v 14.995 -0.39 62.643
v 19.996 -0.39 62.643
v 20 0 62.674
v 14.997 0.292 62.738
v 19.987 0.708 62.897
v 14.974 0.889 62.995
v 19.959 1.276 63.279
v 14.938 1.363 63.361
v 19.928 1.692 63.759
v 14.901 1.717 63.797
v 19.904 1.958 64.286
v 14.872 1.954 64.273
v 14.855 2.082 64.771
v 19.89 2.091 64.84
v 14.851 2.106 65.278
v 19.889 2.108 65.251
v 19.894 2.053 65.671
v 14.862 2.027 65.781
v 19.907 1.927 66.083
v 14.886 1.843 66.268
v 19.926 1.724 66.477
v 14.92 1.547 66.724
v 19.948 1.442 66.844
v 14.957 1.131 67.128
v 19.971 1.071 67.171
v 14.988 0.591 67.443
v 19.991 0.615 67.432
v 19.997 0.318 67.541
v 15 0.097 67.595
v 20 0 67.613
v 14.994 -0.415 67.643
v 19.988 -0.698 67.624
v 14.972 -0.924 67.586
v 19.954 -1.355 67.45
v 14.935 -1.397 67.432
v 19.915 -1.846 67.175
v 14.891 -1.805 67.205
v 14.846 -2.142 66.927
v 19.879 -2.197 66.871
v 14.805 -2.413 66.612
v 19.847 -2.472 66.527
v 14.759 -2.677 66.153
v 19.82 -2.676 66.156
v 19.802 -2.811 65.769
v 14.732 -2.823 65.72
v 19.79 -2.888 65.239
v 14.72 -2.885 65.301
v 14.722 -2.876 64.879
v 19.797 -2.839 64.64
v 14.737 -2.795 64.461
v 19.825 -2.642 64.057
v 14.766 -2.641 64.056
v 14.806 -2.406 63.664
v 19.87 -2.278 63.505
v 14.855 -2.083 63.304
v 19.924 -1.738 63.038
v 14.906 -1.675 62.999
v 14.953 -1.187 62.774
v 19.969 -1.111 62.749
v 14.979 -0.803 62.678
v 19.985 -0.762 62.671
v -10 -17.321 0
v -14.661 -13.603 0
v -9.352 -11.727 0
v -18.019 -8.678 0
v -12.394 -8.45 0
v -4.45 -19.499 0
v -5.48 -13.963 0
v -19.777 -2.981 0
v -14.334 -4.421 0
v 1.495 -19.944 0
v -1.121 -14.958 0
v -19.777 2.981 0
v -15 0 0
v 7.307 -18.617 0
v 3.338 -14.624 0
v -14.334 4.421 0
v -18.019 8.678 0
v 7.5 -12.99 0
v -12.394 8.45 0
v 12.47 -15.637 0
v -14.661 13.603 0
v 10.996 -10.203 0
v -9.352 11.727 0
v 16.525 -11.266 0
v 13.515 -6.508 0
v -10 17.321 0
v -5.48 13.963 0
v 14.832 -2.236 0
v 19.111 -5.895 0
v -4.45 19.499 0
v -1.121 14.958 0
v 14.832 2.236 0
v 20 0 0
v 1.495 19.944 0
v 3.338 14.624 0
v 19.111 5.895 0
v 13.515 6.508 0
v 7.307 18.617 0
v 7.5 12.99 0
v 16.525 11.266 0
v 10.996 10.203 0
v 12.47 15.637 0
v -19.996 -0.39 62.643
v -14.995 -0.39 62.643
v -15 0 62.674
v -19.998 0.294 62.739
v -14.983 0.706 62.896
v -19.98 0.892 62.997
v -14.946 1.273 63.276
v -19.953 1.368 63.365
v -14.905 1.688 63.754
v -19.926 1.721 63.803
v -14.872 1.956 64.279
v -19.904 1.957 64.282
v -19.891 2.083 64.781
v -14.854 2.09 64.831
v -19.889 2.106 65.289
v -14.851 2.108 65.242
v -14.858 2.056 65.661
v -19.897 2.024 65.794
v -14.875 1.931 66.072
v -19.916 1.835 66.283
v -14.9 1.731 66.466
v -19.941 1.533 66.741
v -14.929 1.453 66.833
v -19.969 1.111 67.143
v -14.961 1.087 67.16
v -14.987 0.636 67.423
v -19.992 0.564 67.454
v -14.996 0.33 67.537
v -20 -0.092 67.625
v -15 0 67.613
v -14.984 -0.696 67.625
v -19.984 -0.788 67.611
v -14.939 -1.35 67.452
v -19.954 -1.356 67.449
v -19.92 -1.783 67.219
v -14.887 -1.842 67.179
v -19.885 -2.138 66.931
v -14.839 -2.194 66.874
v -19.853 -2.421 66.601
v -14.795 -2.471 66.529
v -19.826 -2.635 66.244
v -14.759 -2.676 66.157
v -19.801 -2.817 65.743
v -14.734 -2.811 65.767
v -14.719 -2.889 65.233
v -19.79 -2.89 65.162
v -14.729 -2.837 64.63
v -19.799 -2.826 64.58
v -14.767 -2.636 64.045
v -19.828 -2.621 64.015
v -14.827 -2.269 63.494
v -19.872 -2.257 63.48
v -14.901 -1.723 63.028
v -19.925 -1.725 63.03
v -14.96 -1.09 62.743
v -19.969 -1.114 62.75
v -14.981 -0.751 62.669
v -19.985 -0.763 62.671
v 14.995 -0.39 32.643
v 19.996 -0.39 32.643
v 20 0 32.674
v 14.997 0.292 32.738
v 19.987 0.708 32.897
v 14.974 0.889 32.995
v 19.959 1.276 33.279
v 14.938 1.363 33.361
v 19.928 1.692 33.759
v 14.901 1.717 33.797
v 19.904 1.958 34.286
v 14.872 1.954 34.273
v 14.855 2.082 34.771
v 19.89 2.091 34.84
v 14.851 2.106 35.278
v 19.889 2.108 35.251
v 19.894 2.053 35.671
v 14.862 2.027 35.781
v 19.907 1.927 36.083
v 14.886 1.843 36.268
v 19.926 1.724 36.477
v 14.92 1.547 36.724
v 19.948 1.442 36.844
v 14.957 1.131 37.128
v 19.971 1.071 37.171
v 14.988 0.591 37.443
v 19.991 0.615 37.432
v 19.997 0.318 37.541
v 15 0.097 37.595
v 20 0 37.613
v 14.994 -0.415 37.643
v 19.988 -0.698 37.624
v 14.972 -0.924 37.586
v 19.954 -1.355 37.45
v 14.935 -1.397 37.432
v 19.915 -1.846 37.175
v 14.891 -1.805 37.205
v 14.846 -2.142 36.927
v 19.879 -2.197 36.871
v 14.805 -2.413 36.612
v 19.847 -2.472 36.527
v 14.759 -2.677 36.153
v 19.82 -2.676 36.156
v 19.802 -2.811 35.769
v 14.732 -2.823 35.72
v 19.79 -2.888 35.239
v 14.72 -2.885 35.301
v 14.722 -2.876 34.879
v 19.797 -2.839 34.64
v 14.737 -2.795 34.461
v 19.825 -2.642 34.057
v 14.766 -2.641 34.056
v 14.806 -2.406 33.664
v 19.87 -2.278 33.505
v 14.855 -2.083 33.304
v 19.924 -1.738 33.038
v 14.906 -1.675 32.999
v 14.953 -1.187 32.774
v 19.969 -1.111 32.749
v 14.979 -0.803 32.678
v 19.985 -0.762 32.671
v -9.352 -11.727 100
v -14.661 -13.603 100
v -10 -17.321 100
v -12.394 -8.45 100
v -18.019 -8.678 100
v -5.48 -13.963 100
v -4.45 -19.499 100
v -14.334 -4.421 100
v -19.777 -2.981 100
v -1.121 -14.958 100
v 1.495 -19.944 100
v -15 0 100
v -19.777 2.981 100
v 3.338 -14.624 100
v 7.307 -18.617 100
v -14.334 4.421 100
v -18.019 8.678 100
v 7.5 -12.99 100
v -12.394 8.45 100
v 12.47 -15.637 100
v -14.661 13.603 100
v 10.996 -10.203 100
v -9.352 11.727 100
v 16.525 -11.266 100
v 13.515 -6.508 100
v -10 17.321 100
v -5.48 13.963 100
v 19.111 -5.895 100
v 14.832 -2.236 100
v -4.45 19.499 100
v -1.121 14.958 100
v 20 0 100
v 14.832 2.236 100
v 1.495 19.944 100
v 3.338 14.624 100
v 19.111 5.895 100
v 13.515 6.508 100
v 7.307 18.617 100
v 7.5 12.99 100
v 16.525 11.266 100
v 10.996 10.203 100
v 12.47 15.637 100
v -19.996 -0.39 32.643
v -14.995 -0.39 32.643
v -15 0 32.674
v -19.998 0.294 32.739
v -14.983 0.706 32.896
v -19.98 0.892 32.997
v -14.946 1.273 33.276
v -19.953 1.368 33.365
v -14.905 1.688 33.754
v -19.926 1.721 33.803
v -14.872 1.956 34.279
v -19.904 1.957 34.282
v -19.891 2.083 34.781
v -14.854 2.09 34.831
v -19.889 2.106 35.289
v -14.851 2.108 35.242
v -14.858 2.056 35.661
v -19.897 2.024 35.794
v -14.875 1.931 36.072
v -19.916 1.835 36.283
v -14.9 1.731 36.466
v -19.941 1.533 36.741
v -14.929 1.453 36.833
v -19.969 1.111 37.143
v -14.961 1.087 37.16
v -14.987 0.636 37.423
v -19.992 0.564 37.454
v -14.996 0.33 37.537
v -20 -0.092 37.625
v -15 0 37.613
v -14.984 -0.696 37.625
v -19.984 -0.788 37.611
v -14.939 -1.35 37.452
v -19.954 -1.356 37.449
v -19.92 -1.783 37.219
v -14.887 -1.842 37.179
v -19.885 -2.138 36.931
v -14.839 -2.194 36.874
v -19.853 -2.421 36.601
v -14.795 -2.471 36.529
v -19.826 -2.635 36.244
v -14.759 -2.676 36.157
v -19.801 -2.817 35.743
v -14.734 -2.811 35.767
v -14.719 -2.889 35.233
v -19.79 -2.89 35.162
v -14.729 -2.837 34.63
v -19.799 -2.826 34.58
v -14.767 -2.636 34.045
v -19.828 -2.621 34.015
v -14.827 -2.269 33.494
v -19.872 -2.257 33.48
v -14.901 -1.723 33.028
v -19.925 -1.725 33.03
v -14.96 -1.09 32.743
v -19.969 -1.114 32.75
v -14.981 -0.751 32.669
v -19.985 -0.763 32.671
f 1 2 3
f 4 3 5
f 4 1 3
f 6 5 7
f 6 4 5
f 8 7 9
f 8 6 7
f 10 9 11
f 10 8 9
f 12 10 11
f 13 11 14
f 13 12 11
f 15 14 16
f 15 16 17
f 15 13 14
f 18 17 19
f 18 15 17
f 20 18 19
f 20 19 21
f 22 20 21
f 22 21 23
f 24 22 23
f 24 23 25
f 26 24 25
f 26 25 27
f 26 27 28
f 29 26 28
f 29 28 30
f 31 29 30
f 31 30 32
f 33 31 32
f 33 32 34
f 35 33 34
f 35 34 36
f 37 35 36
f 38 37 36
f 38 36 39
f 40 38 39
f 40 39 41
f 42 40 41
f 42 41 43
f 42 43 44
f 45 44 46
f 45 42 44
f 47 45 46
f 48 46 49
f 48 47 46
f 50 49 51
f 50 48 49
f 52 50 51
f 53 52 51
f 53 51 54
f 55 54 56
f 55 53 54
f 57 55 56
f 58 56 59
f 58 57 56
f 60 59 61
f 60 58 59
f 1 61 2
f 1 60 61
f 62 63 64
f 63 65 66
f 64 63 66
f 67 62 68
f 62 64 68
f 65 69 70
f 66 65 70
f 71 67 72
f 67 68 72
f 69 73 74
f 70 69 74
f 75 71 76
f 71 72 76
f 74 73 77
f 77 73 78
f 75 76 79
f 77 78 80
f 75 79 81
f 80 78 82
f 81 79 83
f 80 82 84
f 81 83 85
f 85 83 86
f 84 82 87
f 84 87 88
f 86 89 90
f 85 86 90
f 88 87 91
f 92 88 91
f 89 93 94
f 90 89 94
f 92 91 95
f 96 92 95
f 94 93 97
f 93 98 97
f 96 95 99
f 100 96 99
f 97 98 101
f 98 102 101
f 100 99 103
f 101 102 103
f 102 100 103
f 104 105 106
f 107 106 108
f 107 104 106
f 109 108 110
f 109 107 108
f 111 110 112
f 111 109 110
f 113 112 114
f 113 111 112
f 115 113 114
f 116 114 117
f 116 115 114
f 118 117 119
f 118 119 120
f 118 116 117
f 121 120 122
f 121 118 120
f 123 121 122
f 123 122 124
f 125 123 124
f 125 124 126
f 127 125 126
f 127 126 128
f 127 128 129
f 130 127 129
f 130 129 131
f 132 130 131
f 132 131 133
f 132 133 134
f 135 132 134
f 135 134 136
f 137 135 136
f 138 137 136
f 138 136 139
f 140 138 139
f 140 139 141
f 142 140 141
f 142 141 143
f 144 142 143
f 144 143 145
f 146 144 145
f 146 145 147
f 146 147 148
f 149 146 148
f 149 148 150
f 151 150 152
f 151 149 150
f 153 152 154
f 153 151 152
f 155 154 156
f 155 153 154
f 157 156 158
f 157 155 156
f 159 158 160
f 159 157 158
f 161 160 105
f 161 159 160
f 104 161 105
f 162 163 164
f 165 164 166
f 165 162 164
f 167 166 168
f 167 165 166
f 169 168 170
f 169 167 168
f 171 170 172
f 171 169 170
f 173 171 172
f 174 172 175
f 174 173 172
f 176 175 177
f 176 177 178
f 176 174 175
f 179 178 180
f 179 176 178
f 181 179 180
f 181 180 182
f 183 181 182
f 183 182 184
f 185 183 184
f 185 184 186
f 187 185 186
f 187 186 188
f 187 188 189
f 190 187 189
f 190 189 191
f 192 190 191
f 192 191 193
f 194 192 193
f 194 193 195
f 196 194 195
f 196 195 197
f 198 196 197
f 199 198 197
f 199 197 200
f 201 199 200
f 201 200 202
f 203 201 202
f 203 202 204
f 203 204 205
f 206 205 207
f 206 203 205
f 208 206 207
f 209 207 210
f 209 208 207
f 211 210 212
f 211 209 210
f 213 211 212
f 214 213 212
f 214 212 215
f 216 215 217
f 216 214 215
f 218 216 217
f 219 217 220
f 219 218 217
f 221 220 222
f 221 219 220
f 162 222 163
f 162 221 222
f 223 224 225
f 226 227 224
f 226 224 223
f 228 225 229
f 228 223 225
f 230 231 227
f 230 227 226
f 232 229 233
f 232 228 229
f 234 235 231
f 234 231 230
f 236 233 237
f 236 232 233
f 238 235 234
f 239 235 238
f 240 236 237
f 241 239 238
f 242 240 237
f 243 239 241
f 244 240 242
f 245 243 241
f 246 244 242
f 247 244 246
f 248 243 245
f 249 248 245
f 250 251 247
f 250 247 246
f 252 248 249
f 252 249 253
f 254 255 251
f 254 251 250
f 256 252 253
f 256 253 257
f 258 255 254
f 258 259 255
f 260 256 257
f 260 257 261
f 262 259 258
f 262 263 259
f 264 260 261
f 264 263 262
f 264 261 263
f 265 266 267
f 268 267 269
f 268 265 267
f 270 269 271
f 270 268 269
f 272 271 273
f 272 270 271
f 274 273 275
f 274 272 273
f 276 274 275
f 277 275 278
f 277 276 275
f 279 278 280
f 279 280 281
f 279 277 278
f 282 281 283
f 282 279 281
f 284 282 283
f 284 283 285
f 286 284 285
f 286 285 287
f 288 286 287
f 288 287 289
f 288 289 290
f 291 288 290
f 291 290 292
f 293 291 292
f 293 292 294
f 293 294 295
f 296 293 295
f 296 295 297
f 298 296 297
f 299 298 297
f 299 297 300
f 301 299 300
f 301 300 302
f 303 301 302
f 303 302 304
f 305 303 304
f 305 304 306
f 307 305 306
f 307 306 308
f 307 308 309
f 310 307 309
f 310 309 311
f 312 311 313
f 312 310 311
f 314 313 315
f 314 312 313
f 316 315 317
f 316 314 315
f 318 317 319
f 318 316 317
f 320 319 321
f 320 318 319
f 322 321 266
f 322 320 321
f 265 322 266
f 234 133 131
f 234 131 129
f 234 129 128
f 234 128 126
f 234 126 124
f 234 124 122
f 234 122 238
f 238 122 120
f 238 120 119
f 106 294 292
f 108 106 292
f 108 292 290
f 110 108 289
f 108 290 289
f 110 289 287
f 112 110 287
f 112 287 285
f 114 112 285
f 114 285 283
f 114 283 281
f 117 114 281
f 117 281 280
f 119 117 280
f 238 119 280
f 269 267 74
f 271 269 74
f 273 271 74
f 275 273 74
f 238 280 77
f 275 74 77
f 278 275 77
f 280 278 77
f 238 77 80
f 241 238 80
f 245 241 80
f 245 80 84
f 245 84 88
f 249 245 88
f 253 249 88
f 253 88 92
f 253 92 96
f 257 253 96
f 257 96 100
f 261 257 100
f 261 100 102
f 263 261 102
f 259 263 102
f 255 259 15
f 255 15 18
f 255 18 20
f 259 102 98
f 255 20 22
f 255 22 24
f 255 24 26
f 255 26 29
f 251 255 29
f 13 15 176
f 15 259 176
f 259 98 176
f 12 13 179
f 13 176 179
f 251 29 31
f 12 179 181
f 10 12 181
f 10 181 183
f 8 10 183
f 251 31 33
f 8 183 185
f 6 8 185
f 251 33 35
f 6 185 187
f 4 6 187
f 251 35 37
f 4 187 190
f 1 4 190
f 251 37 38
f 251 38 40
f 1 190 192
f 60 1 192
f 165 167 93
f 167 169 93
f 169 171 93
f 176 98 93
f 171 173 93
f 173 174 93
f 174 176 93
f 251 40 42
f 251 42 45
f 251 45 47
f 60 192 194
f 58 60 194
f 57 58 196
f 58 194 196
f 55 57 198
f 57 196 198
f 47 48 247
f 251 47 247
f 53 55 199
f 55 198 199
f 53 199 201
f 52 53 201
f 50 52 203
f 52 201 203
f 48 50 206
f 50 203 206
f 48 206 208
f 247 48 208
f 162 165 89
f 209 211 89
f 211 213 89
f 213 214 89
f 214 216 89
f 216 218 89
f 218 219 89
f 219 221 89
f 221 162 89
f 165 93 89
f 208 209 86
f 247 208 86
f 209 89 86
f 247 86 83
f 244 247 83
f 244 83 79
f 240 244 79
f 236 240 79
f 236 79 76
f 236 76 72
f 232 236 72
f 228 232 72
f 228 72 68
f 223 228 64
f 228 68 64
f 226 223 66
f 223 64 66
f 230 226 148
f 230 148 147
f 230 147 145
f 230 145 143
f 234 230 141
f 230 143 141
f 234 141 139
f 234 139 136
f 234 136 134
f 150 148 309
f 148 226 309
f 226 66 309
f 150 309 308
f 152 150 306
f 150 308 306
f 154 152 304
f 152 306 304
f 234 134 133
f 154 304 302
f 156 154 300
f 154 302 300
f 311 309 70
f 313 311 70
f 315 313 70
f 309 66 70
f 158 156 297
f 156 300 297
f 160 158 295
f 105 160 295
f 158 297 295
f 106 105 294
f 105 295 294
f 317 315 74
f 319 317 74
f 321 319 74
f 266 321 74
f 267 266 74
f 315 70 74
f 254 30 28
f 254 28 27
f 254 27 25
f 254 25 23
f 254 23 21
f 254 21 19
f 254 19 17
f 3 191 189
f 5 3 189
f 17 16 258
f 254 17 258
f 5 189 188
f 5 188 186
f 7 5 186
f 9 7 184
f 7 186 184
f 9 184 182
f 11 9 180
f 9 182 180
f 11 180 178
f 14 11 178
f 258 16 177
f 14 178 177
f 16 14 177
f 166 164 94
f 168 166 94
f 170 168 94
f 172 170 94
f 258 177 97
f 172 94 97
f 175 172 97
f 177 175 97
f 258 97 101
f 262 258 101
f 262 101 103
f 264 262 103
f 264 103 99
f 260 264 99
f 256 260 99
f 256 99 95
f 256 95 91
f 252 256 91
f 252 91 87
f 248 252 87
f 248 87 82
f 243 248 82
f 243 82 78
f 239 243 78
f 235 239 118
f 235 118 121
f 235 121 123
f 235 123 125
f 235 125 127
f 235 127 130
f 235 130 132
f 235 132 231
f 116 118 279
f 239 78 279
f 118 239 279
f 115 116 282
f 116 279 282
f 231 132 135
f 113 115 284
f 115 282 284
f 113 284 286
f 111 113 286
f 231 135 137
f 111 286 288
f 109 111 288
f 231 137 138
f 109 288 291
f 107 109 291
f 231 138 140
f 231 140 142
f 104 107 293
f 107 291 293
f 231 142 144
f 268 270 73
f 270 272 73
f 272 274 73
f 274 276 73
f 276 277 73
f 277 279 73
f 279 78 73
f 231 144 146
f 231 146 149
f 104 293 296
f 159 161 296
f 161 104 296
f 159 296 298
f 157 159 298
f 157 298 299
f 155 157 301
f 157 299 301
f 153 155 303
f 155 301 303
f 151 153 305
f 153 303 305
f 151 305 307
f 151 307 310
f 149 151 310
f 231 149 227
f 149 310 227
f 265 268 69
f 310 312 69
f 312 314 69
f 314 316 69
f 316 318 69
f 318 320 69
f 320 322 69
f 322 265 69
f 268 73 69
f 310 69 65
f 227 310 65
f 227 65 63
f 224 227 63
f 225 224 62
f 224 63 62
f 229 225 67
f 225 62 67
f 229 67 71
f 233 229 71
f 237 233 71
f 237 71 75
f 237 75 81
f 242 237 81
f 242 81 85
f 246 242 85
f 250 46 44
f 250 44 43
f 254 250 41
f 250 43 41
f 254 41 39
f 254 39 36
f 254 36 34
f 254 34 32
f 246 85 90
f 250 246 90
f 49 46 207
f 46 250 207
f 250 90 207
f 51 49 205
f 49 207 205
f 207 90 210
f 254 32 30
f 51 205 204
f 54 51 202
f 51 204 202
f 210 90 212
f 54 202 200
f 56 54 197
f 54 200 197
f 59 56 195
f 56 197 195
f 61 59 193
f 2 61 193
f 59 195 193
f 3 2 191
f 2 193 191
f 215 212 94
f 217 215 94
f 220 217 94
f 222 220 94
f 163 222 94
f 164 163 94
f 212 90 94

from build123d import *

# Parameters (mm, degrees)
SKETCH1_R               = 20
BOSS_EXTRUDE1_DEPTH     = 100
SKETCH2_R               = 15
CUT_EXTRUDE1_DEPTH      = 100
CUT_EXTRUDE5_DEPTH      = 104.923048454
CUT_EXTRUDE5_DEPTH_BACK = 104.923048454
SKETCH6_R               = 2.5


with BuildPart() as part:
    # Sketch1 → Boss-Extrude1 (new body)
    with BuildSketch(Plane.XY):
        Circle(SKETCH1_R)
    extrude(amount=BOSS_EXTRUDE1_DEPTH)

    # Sketch2 → Cut-Extrude1 (cut)
    with BuildSketch(Plane(origin=(0, 0, 0), x_dir=(-1, 0, 0), z_dir=(0, 0, -1))):
        Circle(SKETCH2_R)
    extrude(amount=-CUT_EXTRUDE1_DEPTH, mode=Mode.SUBTRACT)

    # Sketch6 → Cut-Extrude5 (cut, two sides: drawn at the far end of the back side and taken through both)
    with BuildSketch(Plane(origin=(0, 0, 0), x_dir=(0, 0, -1), z_dir=(1, 0, 0)).offset(-CUT_EXTRUDE5_DEPTH_BACK)):
        with Locations((-65.143240637, -0.390136297)):
            Circle(SKETCH6_R)
        with Locations((-35.143240637, -0.390136297)):
            Circle(SKETCH6_R)
    extrude(amount=CUT_EXTRUDE5_DEPTH + CUT_EXTRUDE5_DEPTH_BACK, mode=Mode.SUBTRACT)


solid = part.part
